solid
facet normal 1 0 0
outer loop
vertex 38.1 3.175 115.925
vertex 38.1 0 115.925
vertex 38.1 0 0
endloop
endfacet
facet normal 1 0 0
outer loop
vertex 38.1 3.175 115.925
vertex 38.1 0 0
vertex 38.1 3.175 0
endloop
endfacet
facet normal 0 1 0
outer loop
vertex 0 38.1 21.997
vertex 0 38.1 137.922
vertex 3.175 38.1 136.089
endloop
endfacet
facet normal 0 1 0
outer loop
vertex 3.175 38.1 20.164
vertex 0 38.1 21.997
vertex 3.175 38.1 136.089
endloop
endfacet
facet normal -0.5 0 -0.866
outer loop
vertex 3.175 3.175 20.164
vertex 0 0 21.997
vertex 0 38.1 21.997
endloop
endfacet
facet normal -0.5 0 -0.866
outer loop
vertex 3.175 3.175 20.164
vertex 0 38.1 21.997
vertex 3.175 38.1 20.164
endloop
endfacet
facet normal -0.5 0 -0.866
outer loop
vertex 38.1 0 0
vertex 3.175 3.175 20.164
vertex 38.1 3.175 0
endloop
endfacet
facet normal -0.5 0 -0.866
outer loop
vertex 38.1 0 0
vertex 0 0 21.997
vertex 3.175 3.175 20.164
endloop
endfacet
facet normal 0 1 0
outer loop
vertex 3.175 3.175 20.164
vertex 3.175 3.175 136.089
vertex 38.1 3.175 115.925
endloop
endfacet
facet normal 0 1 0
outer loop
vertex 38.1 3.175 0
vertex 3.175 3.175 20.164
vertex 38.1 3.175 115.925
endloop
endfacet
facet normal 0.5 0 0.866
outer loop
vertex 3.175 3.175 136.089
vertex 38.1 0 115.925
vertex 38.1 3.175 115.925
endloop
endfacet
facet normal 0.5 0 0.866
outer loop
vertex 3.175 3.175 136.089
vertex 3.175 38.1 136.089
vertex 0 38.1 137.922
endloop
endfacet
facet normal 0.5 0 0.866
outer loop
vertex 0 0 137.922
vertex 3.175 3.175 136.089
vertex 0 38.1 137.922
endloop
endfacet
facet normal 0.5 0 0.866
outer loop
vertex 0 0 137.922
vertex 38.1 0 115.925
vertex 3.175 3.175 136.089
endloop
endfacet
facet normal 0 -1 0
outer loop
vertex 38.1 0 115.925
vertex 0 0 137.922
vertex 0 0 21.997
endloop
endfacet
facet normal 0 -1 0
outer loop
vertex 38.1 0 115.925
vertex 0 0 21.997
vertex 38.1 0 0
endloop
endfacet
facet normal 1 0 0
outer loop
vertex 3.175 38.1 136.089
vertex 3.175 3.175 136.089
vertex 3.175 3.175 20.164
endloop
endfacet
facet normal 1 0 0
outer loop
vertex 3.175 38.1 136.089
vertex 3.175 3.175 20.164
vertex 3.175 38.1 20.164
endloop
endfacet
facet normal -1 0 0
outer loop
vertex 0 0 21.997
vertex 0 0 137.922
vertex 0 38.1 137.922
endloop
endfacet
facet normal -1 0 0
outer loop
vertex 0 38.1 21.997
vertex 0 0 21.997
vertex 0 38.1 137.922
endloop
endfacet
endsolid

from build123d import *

# Parameters (mm, degrees)
SKETCH1_W           = 38.1
SKETCH1_H           = 38.1
BOSS_EXTRUDE1_DEPTH = 137.922
SKETCH2_W           = 34.925
SKETCH2_H           = 34.925
CUT_EXTRUDE1_DEPTH  = 138.922
CUT_EXTRUDE2_DEPTH  = 39.1


with BuildPart() as part:
    # Sketch1 → Boss-Extrude1 (new body)
    with BuildSketch(Plane.XY):
        with Locations((19.05, 19.05)):
            Rectangle(SKETCH1_W, SKETCH1_H)
    extrude(amount=BOSS_EXTRUDE1_DEPTH)

    # Sketch2 → Cut-Extrude1 (cut, through all)
    with BuildSketch(Plane.XY.offset(137.922)):
        with Locations((20.6375, 20.6375)):
            Rectangle(SKETCH2_W, SKETCH2_H)
    extrude(amount=-CUT_EXTRUDE1_DEPTH, mode=Mode.SUBTRACT)

    # Sketch3 → Cut-Extrude2 (cut, through all)
    with BuildSketch(Plane.XZ):
        Polygon((0, 137.922), (38.1, 137.922), (38.1, 115.924954744), align=None)
        Polygon((38.1, 0), (0, 0), (0, 21.997045256), align=None)
    extrude(amount=-CUT_EXTRUDE2_DEPTH, mode=Mode.SUBTRACT)


solid = part.part
